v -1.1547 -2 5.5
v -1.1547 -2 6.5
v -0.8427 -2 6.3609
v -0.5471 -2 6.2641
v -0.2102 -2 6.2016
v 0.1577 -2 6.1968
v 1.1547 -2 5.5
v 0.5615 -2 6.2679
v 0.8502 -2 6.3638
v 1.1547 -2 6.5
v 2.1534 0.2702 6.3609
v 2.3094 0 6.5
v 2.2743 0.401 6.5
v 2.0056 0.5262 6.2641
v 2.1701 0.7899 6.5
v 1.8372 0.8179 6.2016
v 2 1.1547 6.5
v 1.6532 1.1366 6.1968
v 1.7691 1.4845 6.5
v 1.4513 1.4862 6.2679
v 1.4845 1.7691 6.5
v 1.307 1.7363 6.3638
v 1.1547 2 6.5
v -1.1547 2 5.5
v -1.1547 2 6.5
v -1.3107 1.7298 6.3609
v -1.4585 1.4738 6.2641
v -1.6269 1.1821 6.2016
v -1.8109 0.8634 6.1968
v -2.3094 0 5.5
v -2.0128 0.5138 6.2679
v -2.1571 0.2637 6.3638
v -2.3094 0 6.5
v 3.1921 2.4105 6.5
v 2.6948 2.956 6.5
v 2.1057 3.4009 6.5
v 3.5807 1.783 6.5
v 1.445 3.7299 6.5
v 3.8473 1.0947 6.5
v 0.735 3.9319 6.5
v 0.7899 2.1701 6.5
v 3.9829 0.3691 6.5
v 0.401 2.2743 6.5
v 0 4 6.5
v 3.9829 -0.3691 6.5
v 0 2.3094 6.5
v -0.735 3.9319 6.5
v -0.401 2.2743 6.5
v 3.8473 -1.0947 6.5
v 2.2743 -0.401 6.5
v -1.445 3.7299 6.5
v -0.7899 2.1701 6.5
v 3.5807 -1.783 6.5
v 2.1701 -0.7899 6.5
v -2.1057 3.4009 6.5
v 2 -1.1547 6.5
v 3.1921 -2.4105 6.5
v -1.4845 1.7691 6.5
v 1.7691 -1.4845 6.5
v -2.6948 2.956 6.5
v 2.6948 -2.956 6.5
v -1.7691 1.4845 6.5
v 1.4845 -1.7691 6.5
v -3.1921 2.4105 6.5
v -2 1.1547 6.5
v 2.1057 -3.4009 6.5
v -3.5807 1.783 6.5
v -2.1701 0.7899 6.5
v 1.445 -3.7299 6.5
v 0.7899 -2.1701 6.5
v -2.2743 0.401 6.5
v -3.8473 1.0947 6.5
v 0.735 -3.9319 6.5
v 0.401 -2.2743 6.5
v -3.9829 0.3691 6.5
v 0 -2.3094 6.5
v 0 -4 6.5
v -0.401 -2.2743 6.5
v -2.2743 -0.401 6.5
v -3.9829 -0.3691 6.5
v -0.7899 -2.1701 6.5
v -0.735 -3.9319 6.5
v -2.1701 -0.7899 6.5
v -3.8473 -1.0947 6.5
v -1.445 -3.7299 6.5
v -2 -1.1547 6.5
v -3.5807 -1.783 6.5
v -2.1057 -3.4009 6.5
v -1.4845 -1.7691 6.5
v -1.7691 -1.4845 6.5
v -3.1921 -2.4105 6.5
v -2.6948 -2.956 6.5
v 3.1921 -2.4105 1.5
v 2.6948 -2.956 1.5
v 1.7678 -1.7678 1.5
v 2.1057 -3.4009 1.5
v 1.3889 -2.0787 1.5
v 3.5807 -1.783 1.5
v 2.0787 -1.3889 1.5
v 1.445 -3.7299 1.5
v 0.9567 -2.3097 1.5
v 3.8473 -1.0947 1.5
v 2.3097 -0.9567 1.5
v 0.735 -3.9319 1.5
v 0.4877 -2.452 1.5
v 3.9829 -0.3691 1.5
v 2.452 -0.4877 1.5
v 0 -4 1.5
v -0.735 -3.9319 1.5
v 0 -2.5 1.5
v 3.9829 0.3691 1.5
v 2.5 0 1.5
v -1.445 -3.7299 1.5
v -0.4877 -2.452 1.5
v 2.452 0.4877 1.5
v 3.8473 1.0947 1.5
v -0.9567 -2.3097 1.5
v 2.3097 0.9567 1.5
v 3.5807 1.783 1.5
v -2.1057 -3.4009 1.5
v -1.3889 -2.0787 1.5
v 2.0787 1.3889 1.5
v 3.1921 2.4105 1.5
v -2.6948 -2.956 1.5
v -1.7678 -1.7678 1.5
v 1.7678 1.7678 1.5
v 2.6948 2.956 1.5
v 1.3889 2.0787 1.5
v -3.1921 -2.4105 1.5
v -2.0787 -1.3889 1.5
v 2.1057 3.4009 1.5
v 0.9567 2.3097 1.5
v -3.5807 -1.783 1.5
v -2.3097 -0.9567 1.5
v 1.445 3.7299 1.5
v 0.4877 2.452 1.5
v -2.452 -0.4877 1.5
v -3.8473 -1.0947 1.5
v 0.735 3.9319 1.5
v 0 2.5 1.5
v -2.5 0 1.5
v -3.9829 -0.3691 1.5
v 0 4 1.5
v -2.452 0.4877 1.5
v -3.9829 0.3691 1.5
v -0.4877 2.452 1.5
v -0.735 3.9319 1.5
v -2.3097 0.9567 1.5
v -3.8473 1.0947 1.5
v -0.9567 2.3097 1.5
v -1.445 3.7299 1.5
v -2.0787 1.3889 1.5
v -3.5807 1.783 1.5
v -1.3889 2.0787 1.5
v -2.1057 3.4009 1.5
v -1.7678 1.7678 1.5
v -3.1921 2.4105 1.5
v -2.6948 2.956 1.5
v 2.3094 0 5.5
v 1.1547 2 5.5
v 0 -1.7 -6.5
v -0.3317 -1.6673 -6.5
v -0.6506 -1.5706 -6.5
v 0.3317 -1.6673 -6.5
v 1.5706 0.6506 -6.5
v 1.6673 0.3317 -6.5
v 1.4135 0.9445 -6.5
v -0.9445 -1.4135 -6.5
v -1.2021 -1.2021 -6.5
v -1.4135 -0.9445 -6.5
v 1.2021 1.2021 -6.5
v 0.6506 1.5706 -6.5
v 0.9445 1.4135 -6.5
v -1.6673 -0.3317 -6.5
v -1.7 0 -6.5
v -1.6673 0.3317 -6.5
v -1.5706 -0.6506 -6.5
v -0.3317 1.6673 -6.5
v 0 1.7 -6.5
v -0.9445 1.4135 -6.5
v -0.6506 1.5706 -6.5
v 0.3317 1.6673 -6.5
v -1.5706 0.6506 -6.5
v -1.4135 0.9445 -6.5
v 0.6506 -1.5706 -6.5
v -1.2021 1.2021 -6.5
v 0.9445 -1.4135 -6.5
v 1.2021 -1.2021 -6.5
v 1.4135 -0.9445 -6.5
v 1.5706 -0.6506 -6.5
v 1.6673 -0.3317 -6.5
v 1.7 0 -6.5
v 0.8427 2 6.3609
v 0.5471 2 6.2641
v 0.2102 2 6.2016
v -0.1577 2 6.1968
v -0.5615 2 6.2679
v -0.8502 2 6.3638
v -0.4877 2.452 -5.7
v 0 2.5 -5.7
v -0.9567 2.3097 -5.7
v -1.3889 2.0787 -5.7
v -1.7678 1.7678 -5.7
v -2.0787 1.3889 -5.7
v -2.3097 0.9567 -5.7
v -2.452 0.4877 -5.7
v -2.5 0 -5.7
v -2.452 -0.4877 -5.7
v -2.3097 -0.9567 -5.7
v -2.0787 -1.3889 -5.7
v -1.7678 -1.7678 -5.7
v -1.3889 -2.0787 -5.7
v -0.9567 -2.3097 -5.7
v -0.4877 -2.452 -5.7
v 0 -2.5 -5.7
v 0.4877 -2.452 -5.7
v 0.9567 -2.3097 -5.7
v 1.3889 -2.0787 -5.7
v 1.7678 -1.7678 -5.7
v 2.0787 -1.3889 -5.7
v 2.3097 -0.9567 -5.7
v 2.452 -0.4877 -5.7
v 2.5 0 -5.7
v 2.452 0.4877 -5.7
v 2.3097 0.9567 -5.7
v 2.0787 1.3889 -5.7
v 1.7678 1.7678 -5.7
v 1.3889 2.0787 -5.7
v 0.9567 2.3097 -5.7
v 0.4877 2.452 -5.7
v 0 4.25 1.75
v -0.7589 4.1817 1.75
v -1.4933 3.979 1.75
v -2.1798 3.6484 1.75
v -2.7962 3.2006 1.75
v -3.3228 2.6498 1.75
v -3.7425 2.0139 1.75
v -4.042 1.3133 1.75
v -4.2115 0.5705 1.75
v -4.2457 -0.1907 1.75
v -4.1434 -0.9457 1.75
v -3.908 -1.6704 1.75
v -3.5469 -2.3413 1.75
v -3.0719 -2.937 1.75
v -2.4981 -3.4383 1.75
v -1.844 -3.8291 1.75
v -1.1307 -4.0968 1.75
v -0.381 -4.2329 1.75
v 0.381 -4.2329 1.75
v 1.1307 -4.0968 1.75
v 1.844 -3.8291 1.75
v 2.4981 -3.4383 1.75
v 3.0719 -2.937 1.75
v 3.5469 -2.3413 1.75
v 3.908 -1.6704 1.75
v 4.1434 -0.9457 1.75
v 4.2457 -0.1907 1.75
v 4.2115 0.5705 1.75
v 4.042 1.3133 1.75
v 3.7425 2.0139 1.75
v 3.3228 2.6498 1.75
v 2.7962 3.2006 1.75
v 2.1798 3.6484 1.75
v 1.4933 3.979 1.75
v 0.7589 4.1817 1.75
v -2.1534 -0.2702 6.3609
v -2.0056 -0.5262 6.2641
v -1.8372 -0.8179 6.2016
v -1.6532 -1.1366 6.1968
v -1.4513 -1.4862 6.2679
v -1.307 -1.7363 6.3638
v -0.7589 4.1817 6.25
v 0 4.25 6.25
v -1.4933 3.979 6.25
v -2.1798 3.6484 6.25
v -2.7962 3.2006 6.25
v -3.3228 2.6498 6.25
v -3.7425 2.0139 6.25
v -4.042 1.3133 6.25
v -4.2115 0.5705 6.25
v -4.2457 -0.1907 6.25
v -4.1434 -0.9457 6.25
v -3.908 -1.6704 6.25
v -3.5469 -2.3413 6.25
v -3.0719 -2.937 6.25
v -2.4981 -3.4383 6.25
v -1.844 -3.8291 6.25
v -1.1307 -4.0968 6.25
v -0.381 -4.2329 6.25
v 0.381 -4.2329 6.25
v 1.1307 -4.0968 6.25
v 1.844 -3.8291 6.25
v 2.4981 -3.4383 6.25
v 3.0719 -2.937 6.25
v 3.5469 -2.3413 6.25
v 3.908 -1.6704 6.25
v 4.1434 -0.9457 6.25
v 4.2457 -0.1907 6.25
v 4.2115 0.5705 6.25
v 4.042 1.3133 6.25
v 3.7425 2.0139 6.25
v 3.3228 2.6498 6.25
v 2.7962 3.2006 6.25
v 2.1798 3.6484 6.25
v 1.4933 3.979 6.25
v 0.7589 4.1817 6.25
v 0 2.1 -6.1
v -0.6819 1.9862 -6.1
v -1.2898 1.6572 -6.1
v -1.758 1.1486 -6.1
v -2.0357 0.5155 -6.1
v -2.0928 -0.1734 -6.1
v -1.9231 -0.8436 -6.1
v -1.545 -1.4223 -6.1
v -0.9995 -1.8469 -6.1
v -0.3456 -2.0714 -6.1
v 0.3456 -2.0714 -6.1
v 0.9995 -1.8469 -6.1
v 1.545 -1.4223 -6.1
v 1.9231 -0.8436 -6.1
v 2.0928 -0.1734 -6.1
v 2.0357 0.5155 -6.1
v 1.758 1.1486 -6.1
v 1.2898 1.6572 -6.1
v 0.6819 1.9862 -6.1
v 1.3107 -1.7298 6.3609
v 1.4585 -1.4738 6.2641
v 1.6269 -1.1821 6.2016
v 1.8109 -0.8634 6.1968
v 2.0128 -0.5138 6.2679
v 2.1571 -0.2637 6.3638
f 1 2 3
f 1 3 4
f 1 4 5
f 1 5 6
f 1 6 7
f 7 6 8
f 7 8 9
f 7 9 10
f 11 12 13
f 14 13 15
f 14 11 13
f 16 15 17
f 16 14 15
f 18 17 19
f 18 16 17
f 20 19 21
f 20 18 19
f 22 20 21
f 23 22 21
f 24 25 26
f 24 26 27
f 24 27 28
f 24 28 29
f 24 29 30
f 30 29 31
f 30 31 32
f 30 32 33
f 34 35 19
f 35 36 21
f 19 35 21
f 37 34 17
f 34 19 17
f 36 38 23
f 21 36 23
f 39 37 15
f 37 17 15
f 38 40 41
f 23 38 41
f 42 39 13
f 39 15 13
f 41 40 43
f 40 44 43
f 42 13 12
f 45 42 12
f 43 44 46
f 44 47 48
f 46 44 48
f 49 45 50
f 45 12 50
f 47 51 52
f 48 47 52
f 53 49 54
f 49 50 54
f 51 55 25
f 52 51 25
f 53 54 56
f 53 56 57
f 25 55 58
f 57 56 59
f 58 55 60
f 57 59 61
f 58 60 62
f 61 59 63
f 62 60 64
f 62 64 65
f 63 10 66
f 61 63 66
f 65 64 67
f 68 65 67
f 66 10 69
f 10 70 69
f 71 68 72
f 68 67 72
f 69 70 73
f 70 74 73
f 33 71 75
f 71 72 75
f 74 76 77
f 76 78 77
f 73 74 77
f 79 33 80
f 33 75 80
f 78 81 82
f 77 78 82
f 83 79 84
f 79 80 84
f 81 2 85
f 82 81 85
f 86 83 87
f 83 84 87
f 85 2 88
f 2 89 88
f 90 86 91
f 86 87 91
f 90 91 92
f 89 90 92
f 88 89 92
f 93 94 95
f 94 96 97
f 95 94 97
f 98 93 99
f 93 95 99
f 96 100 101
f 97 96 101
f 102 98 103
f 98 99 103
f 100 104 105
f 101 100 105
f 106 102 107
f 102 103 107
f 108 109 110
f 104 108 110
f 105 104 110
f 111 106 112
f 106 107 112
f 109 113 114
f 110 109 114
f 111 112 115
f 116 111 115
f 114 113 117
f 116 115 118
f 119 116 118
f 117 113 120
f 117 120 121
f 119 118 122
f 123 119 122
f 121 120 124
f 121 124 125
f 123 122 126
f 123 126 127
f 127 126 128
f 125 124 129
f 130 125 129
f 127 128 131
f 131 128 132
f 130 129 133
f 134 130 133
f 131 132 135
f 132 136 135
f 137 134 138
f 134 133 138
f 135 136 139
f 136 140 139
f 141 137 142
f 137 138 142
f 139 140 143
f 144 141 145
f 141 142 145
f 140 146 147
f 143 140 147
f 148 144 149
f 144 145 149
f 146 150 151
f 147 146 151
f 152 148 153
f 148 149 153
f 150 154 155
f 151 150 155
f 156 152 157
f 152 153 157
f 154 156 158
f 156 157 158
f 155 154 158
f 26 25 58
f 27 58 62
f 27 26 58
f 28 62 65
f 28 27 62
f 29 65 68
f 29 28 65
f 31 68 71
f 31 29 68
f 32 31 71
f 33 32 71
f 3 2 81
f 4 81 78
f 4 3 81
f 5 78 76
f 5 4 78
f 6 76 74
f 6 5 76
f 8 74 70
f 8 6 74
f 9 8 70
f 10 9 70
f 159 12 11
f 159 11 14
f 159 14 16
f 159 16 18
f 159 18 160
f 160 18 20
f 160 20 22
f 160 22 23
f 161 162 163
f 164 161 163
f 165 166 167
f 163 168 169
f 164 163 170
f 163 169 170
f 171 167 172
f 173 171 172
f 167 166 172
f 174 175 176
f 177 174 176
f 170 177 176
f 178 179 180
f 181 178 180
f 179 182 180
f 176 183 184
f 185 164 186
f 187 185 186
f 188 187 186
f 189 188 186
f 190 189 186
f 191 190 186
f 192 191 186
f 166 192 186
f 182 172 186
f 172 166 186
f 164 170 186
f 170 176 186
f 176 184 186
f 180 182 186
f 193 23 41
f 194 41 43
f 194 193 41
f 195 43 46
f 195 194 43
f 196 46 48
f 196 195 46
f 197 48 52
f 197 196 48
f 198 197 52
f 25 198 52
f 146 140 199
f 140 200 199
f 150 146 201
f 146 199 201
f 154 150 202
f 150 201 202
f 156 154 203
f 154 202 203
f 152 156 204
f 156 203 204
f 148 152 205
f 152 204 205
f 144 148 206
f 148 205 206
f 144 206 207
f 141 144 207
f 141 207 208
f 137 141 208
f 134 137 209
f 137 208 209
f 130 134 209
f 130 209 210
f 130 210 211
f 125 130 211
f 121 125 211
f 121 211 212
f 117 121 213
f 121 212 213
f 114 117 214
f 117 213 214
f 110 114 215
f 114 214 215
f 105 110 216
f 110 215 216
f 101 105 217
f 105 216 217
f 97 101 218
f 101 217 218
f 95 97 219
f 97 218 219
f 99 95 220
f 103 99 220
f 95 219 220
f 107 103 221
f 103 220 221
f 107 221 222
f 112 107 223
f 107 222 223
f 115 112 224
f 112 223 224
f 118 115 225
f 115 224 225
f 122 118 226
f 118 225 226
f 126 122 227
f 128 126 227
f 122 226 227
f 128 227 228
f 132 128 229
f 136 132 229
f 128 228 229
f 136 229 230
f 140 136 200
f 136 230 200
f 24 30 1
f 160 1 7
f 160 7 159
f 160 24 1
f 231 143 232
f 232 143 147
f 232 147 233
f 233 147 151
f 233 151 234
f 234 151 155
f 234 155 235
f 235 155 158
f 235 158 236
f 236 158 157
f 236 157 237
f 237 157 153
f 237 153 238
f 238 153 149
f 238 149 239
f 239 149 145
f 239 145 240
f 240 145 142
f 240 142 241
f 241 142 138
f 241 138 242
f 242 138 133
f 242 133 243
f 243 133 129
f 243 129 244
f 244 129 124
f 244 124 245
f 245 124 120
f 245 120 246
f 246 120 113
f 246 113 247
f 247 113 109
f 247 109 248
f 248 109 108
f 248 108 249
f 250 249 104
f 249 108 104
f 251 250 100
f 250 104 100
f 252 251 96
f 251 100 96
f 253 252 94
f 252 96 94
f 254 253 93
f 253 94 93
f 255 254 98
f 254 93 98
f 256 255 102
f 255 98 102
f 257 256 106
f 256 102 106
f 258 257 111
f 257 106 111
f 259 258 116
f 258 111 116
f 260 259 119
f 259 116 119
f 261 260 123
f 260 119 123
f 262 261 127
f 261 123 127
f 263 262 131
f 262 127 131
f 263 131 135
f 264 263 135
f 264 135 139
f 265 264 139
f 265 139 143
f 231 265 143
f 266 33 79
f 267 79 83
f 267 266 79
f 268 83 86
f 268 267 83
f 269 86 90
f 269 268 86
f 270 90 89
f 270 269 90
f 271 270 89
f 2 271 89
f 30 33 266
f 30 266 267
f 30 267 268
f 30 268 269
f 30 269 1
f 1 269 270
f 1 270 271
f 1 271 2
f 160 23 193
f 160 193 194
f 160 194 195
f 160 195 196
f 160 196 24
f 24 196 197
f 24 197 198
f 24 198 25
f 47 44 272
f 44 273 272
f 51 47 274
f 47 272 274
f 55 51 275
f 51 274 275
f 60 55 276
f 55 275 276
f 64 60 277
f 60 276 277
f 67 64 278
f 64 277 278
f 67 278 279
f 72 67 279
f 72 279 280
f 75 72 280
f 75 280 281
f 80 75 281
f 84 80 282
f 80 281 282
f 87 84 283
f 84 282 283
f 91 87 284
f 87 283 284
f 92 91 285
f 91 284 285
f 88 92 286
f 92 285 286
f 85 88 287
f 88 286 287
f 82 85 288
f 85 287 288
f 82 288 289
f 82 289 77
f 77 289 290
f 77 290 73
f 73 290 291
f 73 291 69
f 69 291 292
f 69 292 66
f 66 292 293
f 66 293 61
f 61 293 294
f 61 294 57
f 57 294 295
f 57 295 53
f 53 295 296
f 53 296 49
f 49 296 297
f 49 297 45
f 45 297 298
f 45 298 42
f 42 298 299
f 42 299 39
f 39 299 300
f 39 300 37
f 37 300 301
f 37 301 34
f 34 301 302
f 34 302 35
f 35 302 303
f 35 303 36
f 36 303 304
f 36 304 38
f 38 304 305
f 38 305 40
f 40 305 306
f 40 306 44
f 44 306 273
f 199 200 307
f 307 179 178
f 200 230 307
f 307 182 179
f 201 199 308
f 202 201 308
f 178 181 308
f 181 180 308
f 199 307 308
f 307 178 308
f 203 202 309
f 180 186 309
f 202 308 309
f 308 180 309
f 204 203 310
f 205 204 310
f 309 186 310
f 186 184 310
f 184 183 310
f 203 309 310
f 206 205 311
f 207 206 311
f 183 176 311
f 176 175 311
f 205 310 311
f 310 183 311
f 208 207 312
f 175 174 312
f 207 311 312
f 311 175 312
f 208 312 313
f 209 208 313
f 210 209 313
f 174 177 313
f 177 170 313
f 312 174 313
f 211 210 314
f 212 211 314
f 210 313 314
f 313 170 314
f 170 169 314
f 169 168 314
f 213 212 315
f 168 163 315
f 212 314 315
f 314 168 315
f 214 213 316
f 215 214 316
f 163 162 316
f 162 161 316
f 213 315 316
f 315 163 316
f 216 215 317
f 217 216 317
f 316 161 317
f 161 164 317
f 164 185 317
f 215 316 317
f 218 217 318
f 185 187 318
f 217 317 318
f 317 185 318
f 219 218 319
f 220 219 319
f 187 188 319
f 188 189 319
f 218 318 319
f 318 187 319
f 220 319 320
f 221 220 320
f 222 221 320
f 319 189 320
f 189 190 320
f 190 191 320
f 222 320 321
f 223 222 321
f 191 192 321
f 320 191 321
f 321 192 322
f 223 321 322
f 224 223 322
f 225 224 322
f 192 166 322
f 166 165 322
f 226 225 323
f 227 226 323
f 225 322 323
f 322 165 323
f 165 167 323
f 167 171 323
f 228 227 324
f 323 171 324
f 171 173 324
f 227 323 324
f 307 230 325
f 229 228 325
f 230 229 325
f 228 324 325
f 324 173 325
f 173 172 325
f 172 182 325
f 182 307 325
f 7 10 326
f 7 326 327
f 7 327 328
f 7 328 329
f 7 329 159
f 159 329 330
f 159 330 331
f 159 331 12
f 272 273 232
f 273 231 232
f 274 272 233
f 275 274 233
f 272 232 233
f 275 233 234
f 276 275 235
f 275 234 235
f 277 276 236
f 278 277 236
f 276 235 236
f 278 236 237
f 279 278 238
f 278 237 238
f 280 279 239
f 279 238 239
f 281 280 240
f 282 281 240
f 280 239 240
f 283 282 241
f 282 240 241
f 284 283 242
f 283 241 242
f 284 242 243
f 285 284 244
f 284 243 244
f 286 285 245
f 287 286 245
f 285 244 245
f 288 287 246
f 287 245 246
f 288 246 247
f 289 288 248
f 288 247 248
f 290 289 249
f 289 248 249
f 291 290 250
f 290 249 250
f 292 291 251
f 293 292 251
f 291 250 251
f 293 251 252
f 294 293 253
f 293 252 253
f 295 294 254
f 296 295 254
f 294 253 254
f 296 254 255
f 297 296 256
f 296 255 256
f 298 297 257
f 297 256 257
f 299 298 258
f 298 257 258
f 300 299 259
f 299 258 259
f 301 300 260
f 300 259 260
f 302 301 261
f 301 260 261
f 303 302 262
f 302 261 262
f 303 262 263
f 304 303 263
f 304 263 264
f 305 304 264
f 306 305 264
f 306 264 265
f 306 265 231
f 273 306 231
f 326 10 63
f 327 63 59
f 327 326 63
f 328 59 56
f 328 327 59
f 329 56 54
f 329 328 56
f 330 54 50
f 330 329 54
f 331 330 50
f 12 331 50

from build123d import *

# Parameters (mm, degrees)
CUT_EXTRUDE1_DEPTH = 1
SKETCH4_R          = 2.309401077
CUT_EXTRUDE2_DEPTH = 0.5
CUT_EXTRUDE2_TAPER = 45


with BuildPart() as part:
    # Sketch2 → Revolve1 (revolve)
    with BuildSketch(Plane(origin=(0, 0, 0), x_dir=(0, 0, -1), z_dir=(1, 0, 0))):
        Polygon((-6.25, 4.25), (-1.75, 4.25), (-1.5, 4), (-1.5, 2.5), (5.7, 2.5), (6.5, 1.7), (6.5, 0), (-6.5, 0), (-6.5, 4), align=None)
    revolve(axis=Axis((0, 0, -6.5), (0, 0, 1)))

    # Sketch3 → Cut-Extrude1 (cut)
    with BuildSketch(Plane.XY.offset(6.5)):
        Polygon((1.154700538, 2), (-1.154700538, 2), (-2.309401077, 0), (-1.154700538, -2), (1.154700538, -2), (2.309401077, 0), align=None)
    extrude(amount=-CUT_EXTRUDE1_DEPTH, mode=Mode.SUBTRACT)

    # Sketch4 → Cut-Extrude2 (cut)
    with BuildSketch(Plane.XY.offset(6.5)):
        Circle(SKETCH4_R)
    extrude(amount=-CUT_EXTRUDE2_DEPTH, taper=CUT_EXTRUDE2_TAPER, mode=Mode.SUBTRACT)


solid = part.part
